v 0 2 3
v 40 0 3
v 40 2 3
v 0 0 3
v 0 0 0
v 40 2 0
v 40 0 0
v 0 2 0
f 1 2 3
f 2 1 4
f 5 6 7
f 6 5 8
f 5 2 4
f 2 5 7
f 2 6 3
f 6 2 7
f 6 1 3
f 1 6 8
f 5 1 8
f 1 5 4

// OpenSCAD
width=40;
shape="round";
internalOffset=0.01;
module model() { cube([width,2,3]); }
model();
